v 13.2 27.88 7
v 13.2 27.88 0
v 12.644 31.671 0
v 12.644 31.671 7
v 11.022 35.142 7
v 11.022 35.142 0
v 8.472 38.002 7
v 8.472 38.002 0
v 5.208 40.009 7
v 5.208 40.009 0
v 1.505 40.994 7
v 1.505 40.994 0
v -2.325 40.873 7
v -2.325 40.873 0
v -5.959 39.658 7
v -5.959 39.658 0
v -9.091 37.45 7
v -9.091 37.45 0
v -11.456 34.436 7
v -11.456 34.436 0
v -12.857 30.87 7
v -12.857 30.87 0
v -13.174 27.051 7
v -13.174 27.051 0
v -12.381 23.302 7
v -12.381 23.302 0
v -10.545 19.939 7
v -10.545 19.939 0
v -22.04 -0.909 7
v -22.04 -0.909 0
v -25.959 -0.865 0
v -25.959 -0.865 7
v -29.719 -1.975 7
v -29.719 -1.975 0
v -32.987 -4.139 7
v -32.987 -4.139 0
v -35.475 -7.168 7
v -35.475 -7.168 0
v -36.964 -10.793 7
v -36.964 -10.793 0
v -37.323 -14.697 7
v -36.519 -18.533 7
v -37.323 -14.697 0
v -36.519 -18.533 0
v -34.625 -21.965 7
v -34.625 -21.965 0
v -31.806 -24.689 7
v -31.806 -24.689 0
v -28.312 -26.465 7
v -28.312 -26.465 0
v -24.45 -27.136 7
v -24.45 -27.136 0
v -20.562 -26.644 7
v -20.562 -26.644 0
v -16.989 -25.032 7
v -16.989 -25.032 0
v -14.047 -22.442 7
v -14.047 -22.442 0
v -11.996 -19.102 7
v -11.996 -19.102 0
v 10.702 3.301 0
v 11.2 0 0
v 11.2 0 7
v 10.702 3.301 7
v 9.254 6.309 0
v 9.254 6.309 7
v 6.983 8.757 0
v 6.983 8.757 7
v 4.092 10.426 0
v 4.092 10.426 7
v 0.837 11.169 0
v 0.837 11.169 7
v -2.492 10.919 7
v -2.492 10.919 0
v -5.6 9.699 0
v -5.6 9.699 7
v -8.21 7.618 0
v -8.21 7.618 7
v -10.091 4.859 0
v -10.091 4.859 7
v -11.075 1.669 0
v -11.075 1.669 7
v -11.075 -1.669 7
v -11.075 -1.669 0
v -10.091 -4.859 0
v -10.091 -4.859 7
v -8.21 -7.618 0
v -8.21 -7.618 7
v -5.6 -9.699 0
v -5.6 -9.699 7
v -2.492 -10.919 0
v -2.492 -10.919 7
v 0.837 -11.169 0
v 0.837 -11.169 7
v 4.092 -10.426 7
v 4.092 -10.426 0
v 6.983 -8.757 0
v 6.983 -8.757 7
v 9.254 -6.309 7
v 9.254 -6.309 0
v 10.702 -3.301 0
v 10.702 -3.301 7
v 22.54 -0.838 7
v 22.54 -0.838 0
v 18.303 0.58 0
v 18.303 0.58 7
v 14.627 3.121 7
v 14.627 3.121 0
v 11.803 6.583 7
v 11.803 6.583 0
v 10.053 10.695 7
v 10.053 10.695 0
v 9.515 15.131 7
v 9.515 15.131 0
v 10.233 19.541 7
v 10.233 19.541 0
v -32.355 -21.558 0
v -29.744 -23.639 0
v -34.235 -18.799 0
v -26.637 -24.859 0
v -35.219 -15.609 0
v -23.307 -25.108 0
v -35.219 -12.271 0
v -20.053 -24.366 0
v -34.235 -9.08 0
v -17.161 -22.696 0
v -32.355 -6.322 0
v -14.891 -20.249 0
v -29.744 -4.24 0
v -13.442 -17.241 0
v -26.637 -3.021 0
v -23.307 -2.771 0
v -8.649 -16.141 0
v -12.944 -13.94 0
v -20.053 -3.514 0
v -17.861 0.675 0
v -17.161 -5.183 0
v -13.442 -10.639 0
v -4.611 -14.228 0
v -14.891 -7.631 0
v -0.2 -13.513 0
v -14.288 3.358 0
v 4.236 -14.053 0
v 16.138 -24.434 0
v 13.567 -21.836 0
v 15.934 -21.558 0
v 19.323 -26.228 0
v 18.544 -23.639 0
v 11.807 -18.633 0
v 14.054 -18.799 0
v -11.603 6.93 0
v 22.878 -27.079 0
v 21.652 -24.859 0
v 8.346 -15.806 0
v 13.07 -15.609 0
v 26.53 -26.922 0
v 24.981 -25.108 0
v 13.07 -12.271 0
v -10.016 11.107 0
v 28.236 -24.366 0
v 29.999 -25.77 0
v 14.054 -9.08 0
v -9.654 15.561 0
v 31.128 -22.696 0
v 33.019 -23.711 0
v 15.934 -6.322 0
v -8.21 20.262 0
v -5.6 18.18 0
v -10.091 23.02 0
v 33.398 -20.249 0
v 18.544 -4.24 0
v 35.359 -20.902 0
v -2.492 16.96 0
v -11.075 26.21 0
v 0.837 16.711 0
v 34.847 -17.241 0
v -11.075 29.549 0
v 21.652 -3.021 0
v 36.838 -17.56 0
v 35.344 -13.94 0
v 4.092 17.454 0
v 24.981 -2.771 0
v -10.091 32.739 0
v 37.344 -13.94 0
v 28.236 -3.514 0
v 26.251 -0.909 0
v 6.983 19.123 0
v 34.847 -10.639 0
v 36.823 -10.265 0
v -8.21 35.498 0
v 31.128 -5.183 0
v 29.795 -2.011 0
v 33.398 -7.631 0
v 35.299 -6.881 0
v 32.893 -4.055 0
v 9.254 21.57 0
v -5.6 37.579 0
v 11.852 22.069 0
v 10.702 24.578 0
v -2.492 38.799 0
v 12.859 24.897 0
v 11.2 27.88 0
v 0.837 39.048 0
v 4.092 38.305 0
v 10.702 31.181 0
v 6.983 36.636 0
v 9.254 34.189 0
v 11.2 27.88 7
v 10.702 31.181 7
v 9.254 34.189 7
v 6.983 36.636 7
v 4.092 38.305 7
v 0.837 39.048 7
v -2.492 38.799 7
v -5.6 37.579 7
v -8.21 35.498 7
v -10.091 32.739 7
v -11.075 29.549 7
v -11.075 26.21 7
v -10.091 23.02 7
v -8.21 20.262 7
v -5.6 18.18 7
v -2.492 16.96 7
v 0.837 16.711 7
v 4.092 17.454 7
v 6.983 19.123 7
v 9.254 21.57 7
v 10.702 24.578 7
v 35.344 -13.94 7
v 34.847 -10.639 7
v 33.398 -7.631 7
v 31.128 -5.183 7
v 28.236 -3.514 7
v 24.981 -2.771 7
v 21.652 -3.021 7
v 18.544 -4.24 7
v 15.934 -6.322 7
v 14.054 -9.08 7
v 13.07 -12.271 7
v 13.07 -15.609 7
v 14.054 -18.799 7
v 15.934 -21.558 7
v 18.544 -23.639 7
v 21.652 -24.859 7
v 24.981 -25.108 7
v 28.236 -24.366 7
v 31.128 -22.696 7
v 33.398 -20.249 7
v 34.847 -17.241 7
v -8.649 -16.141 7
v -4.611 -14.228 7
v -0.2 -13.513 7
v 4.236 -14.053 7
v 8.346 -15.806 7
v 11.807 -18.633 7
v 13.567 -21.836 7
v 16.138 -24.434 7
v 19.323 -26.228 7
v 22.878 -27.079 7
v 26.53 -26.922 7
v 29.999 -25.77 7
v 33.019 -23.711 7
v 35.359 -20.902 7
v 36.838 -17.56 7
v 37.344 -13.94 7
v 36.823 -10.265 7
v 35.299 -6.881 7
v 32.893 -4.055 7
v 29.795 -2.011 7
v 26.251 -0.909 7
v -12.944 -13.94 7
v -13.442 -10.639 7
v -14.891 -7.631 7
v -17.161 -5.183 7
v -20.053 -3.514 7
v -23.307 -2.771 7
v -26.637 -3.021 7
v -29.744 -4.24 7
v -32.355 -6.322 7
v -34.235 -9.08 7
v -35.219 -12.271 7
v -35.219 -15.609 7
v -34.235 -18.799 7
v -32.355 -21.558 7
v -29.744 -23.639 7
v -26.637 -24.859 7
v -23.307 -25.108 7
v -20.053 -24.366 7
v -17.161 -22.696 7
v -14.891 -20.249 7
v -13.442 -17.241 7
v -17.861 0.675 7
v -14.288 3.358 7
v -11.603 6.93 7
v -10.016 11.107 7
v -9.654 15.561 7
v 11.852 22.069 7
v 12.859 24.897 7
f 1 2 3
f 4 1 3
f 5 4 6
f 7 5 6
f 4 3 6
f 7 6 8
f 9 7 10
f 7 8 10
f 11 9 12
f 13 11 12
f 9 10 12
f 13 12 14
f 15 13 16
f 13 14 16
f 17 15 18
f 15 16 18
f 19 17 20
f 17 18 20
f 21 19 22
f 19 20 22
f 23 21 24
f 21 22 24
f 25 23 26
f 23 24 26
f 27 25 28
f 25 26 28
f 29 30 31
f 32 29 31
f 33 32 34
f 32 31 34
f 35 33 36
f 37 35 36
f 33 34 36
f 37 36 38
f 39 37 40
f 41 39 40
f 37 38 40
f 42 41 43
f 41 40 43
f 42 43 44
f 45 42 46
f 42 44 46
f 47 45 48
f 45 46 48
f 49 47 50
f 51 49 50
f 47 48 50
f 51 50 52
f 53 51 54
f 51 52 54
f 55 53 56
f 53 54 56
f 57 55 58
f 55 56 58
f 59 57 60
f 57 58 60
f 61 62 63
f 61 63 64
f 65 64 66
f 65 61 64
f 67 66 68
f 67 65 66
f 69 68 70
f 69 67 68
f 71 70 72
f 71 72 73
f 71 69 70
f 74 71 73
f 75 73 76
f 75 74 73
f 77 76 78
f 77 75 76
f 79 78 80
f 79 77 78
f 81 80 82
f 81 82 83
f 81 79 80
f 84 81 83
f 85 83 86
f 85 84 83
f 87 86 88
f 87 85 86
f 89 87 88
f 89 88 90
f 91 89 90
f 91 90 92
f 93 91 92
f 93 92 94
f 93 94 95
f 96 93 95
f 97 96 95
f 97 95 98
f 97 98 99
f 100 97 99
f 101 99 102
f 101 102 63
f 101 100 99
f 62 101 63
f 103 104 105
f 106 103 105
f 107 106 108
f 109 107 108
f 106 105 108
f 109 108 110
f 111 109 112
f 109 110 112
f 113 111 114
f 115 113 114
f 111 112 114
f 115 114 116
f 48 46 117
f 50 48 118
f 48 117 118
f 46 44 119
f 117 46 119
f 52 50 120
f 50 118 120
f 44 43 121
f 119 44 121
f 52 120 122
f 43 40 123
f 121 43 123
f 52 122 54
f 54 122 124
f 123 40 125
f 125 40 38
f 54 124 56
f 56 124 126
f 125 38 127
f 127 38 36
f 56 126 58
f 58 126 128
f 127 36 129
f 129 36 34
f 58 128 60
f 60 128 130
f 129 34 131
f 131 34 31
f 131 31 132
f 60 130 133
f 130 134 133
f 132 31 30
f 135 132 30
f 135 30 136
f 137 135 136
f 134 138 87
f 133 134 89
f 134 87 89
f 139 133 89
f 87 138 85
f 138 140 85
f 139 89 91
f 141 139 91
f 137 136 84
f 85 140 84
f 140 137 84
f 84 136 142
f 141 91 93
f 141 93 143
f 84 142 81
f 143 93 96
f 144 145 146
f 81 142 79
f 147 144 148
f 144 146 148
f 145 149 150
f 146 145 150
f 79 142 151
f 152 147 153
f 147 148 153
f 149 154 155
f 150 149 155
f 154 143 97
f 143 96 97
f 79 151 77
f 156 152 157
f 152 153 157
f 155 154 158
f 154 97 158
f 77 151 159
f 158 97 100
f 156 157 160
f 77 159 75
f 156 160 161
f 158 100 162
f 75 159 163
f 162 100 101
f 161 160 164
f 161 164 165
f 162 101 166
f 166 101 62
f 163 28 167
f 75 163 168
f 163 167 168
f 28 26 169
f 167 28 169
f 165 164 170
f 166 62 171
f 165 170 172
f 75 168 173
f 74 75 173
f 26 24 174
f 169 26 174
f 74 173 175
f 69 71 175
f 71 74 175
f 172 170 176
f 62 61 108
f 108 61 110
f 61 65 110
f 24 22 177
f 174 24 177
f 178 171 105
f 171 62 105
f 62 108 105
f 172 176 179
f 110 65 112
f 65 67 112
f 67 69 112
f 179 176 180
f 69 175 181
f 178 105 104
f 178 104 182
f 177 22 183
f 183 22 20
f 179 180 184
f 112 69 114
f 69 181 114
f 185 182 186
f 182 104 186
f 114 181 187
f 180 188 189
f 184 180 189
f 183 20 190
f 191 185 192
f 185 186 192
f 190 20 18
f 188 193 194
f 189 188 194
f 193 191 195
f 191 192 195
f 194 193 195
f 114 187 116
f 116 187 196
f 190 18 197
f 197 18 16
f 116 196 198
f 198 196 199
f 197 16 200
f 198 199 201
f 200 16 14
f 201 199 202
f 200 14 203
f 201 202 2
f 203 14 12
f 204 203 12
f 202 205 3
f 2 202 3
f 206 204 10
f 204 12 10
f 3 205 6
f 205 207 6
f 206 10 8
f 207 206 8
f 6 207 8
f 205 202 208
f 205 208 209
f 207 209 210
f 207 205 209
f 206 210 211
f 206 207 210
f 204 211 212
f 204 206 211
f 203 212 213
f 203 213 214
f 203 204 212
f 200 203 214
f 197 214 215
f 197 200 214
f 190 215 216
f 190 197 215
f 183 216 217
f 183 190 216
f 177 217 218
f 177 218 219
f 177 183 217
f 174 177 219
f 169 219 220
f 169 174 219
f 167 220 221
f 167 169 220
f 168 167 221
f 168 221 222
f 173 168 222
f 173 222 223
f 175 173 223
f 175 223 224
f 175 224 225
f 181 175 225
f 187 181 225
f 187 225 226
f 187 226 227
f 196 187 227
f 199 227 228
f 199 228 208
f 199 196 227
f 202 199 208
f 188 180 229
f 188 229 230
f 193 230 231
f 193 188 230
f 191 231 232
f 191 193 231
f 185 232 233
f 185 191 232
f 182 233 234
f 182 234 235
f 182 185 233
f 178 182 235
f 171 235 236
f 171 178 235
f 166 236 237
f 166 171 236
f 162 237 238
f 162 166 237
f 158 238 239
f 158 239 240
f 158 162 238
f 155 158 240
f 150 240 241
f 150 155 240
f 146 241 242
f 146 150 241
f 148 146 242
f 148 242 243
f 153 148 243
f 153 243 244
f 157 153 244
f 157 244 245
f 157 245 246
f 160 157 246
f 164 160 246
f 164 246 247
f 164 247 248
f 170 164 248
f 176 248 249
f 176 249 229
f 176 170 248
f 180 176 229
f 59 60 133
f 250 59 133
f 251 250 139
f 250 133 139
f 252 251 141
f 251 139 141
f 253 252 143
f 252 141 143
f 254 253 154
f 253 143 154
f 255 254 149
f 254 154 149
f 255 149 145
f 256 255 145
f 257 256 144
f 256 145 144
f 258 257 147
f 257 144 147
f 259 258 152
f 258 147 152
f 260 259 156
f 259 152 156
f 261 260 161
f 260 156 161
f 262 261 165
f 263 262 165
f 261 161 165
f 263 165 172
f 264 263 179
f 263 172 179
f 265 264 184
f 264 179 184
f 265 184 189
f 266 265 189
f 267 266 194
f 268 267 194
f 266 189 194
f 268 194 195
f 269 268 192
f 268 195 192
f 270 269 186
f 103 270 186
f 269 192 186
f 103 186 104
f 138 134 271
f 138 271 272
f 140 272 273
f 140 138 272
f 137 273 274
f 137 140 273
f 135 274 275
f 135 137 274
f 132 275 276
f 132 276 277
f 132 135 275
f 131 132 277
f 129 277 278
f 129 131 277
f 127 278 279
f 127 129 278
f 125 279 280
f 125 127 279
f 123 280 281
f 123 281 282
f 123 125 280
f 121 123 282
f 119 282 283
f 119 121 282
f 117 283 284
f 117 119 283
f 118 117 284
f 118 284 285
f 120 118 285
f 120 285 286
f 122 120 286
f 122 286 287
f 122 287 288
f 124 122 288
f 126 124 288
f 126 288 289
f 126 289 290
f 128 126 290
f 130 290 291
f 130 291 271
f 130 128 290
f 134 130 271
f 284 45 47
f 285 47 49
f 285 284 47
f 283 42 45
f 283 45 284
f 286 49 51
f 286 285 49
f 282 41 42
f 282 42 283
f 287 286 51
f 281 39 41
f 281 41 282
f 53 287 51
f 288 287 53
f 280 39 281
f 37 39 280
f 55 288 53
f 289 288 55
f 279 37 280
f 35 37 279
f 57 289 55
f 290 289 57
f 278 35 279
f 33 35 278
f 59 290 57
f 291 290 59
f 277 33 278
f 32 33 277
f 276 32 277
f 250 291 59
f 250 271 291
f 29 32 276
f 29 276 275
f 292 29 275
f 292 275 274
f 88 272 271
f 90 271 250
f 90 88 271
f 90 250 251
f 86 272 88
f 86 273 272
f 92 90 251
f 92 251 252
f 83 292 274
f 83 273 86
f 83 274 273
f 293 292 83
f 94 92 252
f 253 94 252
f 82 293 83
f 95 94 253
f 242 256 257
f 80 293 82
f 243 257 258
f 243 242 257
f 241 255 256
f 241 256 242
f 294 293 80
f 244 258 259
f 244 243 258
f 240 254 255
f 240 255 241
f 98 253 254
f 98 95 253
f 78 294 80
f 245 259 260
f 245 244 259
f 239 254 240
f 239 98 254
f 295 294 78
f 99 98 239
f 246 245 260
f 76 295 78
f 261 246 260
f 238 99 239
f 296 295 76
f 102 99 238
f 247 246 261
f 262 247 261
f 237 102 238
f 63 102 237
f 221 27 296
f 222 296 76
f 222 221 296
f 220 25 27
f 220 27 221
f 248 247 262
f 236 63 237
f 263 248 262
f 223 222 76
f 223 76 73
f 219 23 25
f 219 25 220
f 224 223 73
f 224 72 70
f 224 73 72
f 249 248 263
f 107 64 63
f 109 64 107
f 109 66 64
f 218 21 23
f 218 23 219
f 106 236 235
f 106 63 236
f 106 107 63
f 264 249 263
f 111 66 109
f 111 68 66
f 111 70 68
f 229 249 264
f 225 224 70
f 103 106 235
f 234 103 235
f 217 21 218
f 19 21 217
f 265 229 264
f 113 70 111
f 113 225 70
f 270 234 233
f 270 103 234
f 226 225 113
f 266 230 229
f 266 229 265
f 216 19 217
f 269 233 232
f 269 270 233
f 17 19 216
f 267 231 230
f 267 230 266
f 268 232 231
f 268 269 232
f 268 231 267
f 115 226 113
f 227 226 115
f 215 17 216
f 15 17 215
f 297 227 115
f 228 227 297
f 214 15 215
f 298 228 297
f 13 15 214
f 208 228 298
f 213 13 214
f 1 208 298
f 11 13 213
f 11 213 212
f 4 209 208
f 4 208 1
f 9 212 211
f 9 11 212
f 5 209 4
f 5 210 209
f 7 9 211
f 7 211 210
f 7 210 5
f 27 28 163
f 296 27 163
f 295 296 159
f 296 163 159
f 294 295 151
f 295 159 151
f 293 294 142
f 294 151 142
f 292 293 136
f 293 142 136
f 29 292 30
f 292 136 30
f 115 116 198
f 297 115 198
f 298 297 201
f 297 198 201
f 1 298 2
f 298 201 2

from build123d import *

# Parameters (mm, degrees)
F0_R     = 11.2
F0_R_2   = 13.2
F1_DEPTH = 7


with BuildPart() as f1:
    # F0 (on Top) → F1 (new body)
    with BuildSketch(Plane.XY):
        with BuildLine():
            ThreePointArc((10.232901, 19.541287), (12.436123, 23.454365), (13.2, 27.879616))
            ThreePointArc((13.2, 27.879616), (-4.186254, 40.398213), (-10.544739, 19.939308))
            ThreePointArc((-10.544739, 19.939308), (-0.252816, 14.682038), (10.232901, 19.541287))
        make_face()
        with Locations((0, 27.879616)):
            Circle(F0_R, mode=Mode.SUBTRACT)
        with BuildLine():
            ThreePointArc((-10.944456, -13.939808), (-14.094014, -5.382436), (-22.039701, -0.908691))
            ThreePointArc((-22.039701, -0.908691), (-35.700302, -20.319652), (-11.995578, -19.101666))
            ThreePointArc((-11.995578, -19.101666), (-11.209906, -16.573704), (-10.944456, -13.939808))
        make_face()
        with Locations((-24.144456, -13.939808)):
            Circle(F0_R, mode=Mode.SUBTRACT)
        with BuildLine():
            ThreePointArc((37.344456, -13.939808), (32.892752, -4.055107), (22.540317, -0.837643))
            ThreePointArc((22.540317, -0.837643), (12.841425, -7.122074), (11.8068, -18.632596))
            ThreePointArc((11.8068, -18.632596), (26.530137, -26.922432), (37.344456, -13.939808))
        make_face()
        with Locations((24.144456, -13.939808)):
            Circle(F0_R, mode=Mode.SUBTRACT)
        with BuildLine():
            ThreePointArc((10.232901, 19.541287), (-0.252816, 14.682038), (-10.544739, 19.939308))
            ThreePointArc((-10.544739, 19.939308), (-11.60274, 6.92967), (-22.039701, -0.908691))
            ThreePointArc((-22.039701, -0.908691), (-14.094014, -5.382436), (-10.944456, -13.939808))
            ThreePointArc((-10.944456, -13.939808), (-11.209906, -16.573704), (-11.995578, -19.101666))
            ThreePointArc((-11.995578, -19.101666), (-0.1999, -13.513102), (11.8068, -18.632596))
            ThreePointArc((11.8068, -18.632596), (12.841425, -7.122074), (22.540317, -0.837643))
            ThreePointArc((22.540317, -0.837643), (11.80264, 6.583433), (10.232901, 19.541287))
        make_face()
        Circle(F0_R_2, mode=Mode.SUBTRACT)
        Circle(F0_R_2)
        Circle(F0_R, mode=Mode.SUBTRACT)
    extrude(amount=F1_DEPTH)


solid = f1.part
